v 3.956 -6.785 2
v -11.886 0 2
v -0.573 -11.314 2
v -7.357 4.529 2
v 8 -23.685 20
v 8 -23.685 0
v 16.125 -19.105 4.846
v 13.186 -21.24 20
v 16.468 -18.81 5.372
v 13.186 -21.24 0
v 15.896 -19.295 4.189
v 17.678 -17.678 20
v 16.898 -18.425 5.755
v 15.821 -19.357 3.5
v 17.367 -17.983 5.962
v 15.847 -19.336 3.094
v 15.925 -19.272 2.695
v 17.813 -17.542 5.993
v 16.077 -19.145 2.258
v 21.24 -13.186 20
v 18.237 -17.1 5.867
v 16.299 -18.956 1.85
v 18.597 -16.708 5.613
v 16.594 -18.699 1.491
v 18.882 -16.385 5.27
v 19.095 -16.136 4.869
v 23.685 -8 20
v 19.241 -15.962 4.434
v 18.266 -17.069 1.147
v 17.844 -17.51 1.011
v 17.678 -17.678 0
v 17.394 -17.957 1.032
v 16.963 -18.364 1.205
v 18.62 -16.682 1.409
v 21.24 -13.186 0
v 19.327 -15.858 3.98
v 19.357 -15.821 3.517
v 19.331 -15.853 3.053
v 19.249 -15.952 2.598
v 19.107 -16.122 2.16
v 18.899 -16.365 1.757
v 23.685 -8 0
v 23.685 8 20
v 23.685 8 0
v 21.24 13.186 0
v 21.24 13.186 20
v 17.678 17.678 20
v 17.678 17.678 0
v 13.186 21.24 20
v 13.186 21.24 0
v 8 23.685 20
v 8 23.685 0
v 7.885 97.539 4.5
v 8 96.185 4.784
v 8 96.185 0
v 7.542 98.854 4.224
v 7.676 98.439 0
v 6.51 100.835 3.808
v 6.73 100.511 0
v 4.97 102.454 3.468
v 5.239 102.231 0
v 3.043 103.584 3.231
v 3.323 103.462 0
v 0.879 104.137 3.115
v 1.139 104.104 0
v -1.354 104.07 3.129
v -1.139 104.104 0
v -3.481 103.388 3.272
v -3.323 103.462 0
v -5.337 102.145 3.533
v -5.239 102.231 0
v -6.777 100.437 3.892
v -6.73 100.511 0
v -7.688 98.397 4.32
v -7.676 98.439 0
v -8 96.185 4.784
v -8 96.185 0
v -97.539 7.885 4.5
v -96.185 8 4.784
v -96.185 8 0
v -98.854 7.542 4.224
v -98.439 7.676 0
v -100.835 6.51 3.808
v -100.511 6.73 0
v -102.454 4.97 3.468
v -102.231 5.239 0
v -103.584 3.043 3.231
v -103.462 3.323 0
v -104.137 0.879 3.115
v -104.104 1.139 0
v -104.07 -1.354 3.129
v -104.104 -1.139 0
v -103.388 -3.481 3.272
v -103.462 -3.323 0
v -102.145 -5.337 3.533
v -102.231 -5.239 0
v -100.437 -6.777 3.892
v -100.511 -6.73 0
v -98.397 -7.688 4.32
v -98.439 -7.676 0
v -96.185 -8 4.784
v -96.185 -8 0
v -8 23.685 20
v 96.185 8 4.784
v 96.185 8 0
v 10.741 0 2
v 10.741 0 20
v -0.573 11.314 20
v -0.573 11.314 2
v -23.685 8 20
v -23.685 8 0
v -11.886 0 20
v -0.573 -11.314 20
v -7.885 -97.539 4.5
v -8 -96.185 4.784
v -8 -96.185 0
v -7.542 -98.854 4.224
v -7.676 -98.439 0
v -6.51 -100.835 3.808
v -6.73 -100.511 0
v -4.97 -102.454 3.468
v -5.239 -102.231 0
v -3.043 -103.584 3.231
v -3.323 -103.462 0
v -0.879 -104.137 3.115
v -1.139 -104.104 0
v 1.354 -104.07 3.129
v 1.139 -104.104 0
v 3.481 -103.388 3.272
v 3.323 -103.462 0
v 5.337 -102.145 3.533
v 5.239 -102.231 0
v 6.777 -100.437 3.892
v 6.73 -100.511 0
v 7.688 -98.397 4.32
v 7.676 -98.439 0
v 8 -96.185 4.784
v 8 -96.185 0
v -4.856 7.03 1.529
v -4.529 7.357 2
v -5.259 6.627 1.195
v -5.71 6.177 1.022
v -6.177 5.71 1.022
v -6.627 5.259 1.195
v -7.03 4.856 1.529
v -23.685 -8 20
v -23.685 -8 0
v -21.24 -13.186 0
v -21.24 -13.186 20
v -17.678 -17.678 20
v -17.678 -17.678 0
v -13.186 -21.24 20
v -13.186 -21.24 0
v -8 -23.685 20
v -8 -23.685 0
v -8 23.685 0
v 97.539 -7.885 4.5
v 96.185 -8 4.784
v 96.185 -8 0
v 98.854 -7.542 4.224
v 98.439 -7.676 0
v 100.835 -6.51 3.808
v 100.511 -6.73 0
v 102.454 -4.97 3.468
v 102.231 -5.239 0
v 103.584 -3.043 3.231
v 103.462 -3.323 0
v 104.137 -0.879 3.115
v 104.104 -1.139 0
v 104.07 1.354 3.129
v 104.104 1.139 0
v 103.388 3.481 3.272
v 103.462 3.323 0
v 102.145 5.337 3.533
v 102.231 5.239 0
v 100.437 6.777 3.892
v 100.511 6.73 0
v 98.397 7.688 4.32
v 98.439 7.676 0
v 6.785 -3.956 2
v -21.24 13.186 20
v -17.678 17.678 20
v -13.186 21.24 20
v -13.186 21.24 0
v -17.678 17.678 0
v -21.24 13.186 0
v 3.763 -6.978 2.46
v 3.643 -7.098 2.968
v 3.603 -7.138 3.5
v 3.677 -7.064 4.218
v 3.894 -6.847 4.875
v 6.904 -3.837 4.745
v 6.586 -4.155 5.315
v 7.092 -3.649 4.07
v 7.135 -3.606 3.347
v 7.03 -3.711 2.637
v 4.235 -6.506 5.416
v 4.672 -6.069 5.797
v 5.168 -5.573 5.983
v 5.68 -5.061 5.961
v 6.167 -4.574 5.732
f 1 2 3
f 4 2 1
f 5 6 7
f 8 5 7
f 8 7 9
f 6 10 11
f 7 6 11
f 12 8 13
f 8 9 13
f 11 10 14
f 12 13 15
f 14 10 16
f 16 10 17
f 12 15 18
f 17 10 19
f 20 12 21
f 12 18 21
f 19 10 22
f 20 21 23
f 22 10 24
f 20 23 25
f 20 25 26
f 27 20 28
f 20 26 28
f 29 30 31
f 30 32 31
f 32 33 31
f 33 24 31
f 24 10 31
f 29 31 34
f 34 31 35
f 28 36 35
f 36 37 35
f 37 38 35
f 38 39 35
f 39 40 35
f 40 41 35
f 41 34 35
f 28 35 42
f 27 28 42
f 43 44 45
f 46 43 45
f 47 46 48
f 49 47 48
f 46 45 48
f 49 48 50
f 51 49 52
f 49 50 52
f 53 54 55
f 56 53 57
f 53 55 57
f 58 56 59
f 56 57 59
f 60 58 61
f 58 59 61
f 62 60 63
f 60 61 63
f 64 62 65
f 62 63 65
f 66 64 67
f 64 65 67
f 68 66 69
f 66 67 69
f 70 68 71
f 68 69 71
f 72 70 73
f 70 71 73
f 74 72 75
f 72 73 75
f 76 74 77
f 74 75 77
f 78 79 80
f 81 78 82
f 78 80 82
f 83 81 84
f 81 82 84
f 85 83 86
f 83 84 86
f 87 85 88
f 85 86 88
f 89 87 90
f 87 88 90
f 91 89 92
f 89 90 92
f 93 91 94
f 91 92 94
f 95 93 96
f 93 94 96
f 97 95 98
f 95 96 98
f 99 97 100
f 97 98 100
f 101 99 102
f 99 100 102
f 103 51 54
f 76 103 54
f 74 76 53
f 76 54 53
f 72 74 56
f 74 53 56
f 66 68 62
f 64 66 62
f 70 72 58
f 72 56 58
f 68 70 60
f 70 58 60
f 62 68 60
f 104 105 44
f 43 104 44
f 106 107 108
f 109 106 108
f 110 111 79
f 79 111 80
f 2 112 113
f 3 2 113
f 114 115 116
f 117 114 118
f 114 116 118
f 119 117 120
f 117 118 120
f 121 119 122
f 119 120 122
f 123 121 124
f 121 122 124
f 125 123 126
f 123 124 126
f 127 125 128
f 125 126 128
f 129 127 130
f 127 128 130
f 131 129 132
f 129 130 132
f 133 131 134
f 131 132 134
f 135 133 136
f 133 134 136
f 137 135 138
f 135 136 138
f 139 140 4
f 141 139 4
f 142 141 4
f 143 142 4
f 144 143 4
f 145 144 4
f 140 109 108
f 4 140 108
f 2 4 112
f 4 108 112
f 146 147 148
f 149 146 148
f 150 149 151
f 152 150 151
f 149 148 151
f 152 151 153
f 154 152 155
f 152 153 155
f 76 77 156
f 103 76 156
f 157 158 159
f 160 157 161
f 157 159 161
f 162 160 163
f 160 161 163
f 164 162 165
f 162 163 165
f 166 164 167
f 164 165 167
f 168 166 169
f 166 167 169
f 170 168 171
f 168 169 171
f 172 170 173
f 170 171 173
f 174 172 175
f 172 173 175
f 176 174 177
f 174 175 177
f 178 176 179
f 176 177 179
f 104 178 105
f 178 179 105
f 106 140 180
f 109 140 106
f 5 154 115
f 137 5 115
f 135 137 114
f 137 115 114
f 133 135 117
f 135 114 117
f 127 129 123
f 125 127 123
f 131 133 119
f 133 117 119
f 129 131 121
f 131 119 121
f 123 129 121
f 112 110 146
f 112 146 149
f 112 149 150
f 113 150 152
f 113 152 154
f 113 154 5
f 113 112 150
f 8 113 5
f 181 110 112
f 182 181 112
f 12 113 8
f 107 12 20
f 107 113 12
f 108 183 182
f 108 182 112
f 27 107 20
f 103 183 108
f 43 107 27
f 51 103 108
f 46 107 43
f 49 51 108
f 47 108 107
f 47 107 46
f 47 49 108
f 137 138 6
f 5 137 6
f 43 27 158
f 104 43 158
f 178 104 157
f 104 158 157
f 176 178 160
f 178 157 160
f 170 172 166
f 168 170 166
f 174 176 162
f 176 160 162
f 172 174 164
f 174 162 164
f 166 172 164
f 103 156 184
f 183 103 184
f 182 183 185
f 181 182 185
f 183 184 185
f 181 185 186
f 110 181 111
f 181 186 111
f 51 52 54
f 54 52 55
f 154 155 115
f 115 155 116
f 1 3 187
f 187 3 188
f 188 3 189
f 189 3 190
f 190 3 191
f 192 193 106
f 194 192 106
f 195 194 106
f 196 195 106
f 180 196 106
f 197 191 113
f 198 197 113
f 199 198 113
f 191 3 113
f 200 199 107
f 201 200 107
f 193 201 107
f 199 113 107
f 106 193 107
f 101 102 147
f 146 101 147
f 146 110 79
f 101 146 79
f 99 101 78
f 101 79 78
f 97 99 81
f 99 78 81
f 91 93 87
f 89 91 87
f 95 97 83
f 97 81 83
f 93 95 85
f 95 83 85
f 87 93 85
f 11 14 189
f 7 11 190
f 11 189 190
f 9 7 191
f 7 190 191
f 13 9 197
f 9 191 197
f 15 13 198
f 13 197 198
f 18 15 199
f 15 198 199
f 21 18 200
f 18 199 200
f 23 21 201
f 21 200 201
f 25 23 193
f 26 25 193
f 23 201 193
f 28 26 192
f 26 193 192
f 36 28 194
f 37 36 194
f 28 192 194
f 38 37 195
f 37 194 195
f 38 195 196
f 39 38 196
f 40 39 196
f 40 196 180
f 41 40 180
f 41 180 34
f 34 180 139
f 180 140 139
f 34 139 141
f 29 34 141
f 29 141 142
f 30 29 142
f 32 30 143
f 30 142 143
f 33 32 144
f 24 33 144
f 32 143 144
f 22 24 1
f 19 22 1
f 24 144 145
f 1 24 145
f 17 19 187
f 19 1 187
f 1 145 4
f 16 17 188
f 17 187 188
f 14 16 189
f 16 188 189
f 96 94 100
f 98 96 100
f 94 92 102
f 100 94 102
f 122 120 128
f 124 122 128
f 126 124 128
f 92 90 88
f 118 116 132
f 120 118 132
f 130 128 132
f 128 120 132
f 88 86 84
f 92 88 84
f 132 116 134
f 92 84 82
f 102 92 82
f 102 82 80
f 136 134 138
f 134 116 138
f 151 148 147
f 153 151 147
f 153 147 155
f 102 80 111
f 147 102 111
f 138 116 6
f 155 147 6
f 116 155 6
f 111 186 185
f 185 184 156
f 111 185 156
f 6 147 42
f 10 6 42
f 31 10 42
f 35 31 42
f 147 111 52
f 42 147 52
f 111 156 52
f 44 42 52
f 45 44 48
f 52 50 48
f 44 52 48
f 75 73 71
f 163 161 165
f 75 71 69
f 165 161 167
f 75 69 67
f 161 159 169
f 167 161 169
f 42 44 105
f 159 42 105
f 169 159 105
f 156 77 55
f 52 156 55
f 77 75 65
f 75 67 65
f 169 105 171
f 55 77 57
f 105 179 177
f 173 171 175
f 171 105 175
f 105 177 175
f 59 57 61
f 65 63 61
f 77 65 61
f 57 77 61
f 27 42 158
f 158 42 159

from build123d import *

# Parameters (mm, degrees)
F1_DEPTH       = 20
F3_DEPTH       = 16
F5_DEPTH       = 16
F7_DEPTH       = 16
F9_DEPTH       = 18
F10_R          = 2.5
F11_DEPTH      = 17.4049884739
F11_DEPTH_BACK = 16
F13_DEPTH      = 16


with BuildPart() as f1:
    # F0 (on Top) → F1 (new body)
    with BuildSketch(Plane.XY):
        with BuildLine():
            ThreePointArc((23.6854385647, -8), (24.6691706804, -4.0536425523), (25, 0))
            ThreePointArc((25, 0), (24.6691706804, 4.0536425523), (23.6854385647, 8))
            ThreePointArc((23.6854385647, 8), (17.6776695297, 17.6776695297), (8, 23.6854385647))
            ThreePointArc((8, 23.6854385647), (0, 25), (-8, 23.6854385647))
            ThreePointArc((-8, 23.6854385647), (-17.6776695297, 17.6776695297), (-23.6854385647, 8))
            ThreePointArc((-23.6854385647, 8), (-25, 0), (-23.6854385647, -8))
            ThreePointArc((-23.6854385647, -8), (-17.6776695297, -17.6776695297), (-8, -23.6854385647))
            ThreePointArc((-8, -23.6854385647), (0, -25), (8, -23.6854385647))
            ThreePointArc((8, -23.6854385647), (17.6776695297, -17.6776695297), (23.6854385647, -8))
        make_face()
        with BuildLine():
            ThreePointArc((23.6854385647, 8), (24.6691706804, 4.0536425523), (25, 0))
            ThreePointArc((25, 0), (24.6691706804, -4.0536425523), (23.6854385647, -8))
            Line((23.6854385647, -8), (96.1854385647, -8))
            ThreePointArc((96.1854385647, -8), (104.1854385647, 0), (96.1854385647, 8))
            Line((96.1854385647, 8), (23.6854385647, 8))
        make_face()
        with BuildLine():
            ThreePointArc((-8, 23.6854385647), (0, 25), (8, 23.6854385647))
            Line((8, 23.6854385647), (8, 96.1854385647))
            ThreePointArc((8, 96.1854385647), (0, 104.1854385647), (-8, 96.1854385647))
            Line((-8, 96.1854385647), (-8, 23.6854385647))
        make_face()
        with BuildLine():
            Line((8, -96.1854385647), (8, -23.6854385647))
            ThreePointArc((8, -23.6854385647), (0, -25), (-8, -23.6854385647))
            Line((-8, -23.6854385647), (-8, -96.1854385647))
            ThreePointArc((-8, -96.1854385647), (0, -104.1854385647), (8, -96.1854385647))
        make_face()
        with BuildLine():
            ThreePointArc((-23.6854385647, -8), (-25, 0), (-23.6854385647, 8))
            Line((-23.6854385647, 8), (-96.1854385647, 8))
            ThreePointArc((-96.1854385647, 8), (-104.1854385647, 0), (-96.1854385647, -8))
            Line((-96.1854385647, -8), (-23.6854385647, -8))
        make_face()
    extrude(amount=F1_DEPTH)

    # F2 (on face) → F3 (cut, through all)
    with BuildSketch(Plane.YZ.offset(8)):
        Polygon((104.6854385647, 20), (23.6854385647, 20), (104.6854385647, 3), align=None)
    extrude(amount=-F3_DEPTH, mode=Mode.SUBTRACT)

    # F4 (on face) → F5 (cut, through all)
    with BuildSketch(Plane(origin=(0, 8, 0), x_dir=(-1, 0, 0), z_dir=(0, 1, 0))):
        Polygon((104.6854385647, 20), (23.6854385647, 20), (104.6854385647, 3), align=None)
    extrude(amount=-F5_DEPTH, mode=Mode.SUBTRACT)

    # F6 (on face) → F7 (cut, through all)
    with BuildSketch(Plane(origin=(-8, 0, 0), x_dir=(0, -1, 0), z_dir=(-1, 0, 0))):
        Polygon((104.6854385647, 20), (23.6854385647, 20), (104.6854385647, 3), align=None)
    extrude(amount=-F7_DEPTH, mode=Mode.SUBTRACT)

    # F8 (on face) → F9 (cut)
    with BuildSketch(Plane.XY.offset(20)):
        Polygon((10.7409683065, 0), (-0.5727401924, 11.313708499), (-11.8864486914, 0), (-0.5727401924, -11.313708499), align=None)
    extrude(amount=-F9_DEPTH, mode=Mode.SUBTRACT)

    # F10 (on face) → F11 (cut, two sides)
    with BuildSketch(Plane(origin=(5.3704841533, -5.3704841533, 0), x_dir=(-0.7071067812, -0.7071067812, 0), z_dir=(-0.7071067812, 0.7071067812, 0))) as f11_sk:
        with Locations((0, 3.5)):
            Circle(F10_R)
    extrude(amount=-F11_DEPTH, mode=Mode.SUBTRACT)
    extrude(f11_sk.sketch, amount=F11_DEPTH_BACK, mode=Mode.SUBTRACT)

    # F12 (on face) → F13 (cut, through all)
    with BuildSketch(Plane.XZ.offset(8)):
        Polygon((104.6854385647, 20), (23.6854385647, 20), (104.6854385647, 3), align=None)
    extrude(amount=-F13_DEPTH, mode=Mode.SUBTRACT)


solid = f1.part
